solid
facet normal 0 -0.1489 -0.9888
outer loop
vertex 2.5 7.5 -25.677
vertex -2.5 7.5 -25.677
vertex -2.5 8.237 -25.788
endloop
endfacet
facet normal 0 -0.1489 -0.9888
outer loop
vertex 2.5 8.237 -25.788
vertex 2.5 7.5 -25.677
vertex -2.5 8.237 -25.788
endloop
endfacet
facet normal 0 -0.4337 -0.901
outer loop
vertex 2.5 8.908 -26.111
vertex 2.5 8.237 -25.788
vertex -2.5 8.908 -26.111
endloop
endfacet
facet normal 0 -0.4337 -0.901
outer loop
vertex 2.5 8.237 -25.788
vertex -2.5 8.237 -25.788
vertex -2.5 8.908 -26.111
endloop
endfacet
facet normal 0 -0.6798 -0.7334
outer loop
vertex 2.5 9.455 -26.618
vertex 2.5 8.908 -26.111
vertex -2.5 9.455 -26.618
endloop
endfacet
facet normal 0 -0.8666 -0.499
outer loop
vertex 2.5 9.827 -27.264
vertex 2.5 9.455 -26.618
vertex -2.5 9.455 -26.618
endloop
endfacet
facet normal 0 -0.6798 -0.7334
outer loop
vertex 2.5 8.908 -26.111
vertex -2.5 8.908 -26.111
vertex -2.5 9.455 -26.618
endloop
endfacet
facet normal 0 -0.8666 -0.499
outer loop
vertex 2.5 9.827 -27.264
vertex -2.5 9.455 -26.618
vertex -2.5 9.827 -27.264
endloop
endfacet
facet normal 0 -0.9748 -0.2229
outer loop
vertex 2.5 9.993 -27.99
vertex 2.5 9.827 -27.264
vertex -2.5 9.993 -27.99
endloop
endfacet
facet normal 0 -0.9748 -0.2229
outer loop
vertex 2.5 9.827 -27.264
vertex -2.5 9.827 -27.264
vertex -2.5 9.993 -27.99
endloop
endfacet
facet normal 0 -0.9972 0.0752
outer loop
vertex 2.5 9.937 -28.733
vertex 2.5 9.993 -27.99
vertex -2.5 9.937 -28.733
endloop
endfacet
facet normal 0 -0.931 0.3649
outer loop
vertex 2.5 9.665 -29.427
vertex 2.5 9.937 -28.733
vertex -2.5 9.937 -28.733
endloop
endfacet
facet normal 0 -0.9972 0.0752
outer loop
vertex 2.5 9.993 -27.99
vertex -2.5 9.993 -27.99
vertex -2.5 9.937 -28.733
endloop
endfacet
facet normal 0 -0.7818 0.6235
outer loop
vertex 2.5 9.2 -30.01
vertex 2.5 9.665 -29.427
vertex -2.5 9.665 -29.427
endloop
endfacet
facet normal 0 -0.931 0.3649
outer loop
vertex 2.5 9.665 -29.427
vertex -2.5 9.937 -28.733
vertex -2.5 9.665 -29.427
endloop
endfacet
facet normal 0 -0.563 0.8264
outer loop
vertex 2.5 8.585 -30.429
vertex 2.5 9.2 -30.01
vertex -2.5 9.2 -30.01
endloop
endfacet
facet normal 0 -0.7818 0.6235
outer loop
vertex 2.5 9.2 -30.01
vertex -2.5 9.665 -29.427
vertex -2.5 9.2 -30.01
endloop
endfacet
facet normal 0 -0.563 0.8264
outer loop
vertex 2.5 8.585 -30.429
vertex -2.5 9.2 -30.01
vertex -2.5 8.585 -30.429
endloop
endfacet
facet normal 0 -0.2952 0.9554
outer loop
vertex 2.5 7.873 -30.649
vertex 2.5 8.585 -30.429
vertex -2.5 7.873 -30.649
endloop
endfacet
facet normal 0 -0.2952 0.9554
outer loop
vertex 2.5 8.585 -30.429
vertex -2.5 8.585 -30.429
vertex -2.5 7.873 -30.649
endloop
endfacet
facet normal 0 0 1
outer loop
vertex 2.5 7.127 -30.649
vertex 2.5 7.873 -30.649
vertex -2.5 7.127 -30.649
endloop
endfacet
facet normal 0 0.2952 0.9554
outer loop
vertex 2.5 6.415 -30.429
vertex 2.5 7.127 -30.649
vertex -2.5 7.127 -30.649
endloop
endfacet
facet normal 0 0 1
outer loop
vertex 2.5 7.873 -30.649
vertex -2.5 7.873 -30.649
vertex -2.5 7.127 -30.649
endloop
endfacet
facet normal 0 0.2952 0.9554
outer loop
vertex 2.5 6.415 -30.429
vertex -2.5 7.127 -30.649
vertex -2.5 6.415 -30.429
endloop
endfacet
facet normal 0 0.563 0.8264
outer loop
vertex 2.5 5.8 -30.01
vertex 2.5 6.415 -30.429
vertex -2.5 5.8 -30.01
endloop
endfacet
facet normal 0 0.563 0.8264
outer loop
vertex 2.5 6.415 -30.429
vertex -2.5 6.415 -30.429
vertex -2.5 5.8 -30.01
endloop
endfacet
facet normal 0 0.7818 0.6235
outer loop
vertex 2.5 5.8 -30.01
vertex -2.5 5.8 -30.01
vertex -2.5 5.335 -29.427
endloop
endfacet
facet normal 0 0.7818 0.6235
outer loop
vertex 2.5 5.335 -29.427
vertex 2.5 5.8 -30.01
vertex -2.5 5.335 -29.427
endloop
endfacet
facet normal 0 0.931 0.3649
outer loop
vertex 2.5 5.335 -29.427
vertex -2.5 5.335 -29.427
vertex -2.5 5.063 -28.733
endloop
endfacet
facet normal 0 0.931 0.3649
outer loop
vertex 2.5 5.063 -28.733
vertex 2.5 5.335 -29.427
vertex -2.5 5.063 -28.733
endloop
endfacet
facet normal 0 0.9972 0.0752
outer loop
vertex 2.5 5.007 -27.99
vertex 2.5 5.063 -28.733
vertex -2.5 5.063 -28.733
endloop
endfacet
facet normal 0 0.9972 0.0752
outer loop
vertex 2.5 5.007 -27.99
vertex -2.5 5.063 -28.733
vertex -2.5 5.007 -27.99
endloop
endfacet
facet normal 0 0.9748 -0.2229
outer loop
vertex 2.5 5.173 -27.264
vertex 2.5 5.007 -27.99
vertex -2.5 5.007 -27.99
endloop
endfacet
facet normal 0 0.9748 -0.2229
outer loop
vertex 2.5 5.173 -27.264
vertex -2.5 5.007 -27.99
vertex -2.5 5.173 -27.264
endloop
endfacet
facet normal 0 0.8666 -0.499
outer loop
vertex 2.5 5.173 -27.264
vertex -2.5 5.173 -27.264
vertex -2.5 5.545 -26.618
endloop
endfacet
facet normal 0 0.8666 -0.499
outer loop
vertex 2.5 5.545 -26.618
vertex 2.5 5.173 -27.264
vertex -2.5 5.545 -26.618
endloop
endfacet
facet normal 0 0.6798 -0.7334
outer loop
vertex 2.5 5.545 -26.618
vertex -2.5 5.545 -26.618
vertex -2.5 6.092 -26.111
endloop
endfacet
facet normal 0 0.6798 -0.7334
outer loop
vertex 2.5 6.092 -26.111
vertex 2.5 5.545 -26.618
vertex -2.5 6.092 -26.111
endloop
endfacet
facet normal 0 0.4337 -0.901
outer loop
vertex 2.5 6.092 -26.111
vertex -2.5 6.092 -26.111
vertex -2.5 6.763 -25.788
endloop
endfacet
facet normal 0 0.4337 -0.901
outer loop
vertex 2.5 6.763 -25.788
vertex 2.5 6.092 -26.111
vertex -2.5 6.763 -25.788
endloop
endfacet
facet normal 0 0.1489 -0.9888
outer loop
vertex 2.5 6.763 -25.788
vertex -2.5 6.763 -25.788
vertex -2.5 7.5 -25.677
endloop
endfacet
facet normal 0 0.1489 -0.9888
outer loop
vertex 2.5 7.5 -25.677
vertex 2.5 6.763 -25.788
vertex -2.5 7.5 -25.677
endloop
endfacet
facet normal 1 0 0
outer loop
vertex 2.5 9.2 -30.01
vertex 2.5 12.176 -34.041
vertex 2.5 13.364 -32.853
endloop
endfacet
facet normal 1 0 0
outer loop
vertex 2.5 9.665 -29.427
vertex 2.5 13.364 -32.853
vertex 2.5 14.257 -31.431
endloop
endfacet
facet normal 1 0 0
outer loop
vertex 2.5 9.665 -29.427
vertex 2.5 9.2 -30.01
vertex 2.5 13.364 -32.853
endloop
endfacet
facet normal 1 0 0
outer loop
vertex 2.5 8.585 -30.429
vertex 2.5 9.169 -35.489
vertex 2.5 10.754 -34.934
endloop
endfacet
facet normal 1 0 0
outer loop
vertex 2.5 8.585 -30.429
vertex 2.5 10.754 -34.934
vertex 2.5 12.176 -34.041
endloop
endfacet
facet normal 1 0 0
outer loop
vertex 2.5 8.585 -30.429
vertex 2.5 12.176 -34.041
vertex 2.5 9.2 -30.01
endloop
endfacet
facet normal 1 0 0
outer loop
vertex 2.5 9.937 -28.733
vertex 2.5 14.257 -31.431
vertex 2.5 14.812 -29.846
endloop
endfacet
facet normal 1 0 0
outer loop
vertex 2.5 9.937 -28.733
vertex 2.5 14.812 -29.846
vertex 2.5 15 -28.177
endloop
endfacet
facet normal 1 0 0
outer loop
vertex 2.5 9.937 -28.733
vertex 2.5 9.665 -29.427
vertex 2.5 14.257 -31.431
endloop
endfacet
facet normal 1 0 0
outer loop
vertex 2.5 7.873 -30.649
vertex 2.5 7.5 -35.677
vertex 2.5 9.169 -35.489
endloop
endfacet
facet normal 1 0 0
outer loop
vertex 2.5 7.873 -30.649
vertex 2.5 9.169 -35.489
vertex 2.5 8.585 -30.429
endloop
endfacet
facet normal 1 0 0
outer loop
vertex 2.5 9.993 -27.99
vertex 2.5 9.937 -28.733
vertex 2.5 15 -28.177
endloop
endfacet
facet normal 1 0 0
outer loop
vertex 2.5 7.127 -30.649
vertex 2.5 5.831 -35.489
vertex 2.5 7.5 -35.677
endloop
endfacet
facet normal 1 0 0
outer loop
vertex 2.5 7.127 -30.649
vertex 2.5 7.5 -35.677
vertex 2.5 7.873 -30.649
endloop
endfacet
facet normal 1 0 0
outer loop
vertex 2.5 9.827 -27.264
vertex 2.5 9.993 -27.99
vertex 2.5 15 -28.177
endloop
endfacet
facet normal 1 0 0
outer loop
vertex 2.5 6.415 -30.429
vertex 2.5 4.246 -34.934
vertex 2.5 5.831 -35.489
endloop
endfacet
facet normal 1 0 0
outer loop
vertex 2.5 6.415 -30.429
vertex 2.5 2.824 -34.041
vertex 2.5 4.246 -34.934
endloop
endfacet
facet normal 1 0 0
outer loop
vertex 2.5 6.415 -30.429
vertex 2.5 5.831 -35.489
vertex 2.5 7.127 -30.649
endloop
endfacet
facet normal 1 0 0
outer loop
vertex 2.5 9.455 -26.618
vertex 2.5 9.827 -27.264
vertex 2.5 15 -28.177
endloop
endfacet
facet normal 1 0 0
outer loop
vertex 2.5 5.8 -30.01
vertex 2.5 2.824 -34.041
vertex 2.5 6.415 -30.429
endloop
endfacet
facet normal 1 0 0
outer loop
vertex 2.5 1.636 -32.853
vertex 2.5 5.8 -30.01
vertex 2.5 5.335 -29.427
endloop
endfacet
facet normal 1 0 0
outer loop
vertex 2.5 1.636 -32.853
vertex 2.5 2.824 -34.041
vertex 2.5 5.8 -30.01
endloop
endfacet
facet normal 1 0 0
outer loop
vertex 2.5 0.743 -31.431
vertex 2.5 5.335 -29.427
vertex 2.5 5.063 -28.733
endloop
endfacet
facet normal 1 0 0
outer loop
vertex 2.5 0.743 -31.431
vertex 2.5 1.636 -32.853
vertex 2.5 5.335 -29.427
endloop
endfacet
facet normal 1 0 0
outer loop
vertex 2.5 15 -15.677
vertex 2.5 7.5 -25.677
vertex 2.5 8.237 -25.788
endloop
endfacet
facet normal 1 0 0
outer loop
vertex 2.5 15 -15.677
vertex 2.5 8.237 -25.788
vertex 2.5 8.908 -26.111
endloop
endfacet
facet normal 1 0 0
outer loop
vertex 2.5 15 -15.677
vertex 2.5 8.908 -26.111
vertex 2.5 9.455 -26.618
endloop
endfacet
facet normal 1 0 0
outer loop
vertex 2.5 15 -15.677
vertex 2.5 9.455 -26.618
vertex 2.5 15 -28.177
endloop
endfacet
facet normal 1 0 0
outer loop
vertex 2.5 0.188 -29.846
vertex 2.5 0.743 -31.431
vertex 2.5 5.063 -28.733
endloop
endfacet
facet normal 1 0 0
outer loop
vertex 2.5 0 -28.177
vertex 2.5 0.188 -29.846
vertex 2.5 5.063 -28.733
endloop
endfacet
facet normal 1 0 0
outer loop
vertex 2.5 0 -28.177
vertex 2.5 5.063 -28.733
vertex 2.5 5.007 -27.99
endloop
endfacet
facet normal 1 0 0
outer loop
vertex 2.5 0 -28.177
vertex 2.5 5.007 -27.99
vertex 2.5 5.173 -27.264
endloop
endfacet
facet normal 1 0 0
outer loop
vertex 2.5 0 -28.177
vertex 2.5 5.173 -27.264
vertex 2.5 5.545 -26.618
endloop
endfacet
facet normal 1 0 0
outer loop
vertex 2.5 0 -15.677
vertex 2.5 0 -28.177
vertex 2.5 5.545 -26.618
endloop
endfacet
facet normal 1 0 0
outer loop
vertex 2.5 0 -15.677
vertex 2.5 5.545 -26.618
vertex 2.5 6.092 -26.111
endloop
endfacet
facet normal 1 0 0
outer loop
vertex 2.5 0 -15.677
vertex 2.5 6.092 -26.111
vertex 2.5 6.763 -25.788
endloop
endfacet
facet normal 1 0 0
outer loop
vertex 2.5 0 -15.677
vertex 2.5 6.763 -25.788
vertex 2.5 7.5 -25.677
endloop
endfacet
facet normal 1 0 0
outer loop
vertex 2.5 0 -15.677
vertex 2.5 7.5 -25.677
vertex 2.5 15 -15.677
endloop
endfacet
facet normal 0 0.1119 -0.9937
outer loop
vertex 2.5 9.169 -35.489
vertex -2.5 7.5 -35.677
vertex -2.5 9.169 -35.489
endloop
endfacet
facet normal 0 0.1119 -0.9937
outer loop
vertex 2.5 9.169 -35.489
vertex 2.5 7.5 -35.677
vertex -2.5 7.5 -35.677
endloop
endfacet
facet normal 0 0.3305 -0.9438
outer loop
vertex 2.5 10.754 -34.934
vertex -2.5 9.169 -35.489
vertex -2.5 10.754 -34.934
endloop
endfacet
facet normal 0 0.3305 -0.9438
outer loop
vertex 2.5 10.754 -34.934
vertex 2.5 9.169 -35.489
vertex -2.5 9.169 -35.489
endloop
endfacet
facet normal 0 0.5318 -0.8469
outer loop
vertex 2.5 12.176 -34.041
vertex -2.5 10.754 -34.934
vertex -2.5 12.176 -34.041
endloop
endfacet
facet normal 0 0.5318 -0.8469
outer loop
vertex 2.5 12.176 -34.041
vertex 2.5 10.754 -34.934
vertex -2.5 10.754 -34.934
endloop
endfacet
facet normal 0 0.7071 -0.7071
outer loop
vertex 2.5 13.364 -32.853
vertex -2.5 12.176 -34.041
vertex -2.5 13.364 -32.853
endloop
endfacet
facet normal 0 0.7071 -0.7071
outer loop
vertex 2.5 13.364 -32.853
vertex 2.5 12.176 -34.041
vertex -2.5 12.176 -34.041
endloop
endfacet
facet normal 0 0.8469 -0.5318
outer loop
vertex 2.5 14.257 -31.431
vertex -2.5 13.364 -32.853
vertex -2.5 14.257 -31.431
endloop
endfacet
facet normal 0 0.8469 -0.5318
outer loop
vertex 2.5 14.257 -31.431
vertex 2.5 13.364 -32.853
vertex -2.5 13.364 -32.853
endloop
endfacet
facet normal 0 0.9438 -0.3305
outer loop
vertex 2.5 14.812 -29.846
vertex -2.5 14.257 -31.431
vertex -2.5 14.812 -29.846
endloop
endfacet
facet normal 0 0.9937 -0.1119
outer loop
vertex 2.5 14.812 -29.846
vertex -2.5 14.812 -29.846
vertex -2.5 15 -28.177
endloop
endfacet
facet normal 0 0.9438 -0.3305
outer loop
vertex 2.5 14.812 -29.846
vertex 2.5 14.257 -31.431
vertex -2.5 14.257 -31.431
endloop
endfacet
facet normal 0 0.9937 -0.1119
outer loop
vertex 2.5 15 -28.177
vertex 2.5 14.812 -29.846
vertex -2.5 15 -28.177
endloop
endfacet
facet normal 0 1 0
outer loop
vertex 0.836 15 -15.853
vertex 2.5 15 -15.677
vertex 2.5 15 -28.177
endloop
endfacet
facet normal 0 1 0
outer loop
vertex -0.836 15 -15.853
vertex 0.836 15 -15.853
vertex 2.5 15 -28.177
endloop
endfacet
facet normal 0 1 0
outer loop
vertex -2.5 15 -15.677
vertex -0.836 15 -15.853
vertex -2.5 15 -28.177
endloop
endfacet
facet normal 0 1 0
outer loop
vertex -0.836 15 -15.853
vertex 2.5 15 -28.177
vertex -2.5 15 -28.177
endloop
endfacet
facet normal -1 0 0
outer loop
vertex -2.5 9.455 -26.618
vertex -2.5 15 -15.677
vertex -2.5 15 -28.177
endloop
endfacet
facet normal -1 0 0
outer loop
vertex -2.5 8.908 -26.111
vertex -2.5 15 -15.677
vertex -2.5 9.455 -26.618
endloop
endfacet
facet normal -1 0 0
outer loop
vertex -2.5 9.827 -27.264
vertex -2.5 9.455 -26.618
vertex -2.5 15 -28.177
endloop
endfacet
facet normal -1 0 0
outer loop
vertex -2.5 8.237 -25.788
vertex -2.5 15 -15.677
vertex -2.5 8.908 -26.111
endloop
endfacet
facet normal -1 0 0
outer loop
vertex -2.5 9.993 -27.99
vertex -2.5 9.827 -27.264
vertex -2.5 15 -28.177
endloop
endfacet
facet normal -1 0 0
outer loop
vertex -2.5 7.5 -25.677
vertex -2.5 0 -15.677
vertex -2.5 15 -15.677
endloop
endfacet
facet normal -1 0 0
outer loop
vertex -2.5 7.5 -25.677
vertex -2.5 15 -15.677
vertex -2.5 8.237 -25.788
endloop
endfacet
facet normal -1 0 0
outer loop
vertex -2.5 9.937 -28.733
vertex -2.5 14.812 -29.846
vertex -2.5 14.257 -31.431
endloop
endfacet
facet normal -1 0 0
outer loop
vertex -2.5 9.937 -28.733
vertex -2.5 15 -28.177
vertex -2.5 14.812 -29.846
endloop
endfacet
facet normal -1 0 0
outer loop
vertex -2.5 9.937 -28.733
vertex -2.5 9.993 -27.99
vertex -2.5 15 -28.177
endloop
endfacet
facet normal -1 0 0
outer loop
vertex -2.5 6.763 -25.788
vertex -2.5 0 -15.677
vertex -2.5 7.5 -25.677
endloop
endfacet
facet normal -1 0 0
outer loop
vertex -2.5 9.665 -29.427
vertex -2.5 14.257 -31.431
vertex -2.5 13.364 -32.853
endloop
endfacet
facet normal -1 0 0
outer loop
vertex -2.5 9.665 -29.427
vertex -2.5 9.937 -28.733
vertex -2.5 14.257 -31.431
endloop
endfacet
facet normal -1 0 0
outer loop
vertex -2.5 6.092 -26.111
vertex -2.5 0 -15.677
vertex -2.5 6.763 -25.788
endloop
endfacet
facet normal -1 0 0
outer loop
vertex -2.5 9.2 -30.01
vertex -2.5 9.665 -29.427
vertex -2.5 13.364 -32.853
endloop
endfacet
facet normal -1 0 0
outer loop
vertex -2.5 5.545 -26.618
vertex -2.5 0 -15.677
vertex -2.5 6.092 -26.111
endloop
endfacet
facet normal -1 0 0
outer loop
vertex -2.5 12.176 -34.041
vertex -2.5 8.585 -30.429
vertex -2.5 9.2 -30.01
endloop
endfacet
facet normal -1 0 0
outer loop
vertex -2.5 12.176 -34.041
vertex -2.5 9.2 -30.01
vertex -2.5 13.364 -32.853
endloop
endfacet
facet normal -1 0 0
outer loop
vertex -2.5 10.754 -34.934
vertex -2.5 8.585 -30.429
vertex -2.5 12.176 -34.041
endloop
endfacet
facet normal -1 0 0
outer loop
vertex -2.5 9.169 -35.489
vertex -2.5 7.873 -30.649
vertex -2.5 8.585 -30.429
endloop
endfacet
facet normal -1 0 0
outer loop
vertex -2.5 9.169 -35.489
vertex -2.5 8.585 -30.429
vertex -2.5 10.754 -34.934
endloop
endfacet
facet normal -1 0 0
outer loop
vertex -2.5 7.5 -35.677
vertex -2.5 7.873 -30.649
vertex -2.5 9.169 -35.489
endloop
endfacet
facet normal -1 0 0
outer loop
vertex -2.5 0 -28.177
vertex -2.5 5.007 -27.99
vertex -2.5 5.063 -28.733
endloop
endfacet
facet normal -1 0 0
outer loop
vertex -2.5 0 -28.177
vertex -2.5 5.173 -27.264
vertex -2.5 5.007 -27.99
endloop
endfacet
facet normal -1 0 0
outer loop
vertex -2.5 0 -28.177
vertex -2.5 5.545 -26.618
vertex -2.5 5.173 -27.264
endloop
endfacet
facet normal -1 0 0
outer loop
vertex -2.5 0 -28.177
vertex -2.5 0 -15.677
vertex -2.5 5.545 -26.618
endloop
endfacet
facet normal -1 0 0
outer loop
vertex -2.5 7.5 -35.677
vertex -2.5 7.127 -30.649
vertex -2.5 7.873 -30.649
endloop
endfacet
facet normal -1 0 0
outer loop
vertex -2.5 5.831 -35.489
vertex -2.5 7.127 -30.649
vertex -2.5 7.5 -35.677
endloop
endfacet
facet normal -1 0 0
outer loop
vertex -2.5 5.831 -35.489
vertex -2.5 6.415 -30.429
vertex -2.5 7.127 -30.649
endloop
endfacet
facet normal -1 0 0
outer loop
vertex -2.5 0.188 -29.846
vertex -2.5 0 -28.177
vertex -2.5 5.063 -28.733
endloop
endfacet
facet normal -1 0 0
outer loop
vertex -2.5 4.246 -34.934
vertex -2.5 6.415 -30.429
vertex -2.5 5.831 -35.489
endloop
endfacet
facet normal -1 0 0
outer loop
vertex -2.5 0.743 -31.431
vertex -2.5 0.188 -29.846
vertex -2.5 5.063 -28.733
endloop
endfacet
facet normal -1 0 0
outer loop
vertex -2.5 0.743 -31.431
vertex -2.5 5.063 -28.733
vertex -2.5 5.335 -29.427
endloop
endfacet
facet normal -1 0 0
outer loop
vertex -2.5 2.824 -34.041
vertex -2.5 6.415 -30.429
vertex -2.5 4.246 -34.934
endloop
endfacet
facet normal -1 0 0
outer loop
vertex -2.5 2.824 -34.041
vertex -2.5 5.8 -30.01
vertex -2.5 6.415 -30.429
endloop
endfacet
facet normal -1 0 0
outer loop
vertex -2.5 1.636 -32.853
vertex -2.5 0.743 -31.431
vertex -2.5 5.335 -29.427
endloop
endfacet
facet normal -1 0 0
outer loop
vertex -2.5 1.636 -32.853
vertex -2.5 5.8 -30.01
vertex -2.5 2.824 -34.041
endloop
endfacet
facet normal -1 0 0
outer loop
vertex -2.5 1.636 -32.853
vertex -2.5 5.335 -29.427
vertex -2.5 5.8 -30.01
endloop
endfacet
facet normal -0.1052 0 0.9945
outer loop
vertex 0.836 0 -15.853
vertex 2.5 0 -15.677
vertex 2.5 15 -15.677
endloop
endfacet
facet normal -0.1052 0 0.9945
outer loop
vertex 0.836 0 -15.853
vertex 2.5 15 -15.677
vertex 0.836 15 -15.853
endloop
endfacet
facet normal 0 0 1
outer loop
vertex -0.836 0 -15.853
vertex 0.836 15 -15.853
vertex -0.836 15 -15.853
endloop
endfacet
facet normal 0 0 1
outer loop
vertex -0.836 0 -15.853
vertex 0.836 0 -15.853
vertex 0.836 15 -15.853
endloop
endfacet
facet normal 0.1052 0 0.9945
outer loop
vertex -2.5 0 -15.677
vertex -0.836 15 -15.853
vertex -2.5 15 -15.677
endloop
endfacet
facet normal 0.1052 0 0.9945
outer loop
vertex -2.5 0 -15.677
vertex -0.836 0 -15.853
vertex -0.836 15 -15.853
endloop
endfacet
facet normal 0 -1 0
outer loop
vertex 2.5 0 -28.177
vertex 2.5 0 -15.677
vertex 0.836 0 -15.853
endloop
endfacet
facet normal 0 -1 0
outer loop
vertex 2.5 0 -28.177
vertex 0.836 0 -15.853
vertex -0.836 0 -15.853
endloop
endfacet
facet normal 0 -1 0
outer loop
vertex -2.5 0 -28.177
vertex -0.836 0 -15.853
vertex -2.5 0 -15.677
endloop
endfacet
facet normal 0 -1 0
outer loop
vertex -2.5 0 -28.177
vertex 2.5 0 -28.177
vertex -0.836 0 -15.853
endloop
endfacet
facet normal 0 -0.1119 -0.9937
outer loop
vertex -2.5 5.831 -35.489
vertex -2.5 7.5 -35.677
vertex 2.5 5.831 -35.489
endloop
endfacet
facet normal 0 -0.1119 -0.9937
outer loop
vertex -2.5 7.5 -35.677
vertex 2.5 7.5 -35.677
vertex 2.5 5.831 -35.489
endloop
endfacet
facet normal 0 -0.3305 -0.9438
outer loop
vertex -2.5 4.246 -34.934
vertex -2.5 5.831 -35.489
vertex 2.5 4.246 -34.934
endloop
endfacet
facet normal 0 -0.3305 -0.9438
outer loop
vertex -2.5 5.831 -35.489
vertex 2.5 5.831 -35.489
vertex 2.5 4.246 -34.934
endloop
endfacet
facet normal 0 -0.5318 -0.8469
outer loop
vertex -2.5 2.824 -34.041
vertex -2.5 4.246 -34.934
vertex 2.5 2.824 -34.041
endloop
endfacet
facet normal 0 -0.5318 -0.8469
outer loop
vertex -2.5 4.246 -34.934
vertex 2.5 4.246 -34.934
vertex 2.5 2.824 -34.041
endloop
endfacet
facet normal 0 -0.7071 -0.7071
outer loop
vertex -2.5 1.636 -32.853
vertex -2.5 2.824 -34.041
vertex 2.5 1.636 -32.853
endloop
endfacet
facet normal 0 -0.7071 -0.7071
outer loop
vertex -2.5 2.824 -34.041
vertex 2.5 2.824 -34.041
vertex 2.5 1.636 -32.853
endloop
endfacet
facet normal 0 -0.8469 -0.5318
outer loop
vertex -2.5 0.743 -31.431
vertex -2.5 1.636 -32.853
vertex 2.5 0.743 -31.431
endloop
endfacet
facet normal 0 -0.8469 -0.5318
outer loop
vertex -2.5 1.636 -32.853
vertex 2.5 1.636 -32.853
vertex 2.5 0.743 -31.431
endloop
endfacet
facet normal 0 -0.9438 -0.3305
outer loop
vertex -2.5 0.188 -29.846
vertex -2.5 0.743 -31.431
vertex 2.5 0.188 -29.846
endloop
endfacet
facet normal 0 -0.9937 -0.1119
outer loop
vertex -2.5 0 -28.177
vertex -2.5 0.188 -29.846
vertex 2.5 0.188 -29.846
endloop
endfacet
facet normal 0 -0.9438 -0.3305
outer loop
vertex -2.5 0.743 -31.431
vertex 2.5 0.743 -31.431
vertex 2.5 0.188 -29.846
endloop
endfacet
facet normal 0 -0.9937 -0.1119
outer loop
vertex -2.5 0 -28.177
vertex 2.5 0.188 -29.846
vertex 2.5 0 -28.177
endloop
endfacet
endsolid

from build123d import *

# Parameters (mm, degrees)
BOSS_EXTRUDE1_DEPTH = 15
FILLET1_R           = 7.5
SKETCH2_R           = 2.5
CUT_EXTRUDE1_DEPTH  = 40.023610486


with BuildPart() as part:
    # Sketch1 → Boss-Extrude1 (new body)
    with BuildSketch(Plane(origin=(0, 0, 0), x_dir=(1, 0, 0), z_dir=(0, 1, 0))):
        with BuildLine():
            Line((-2.5, 15.676913759), (-2.5, 35.676913759))
            Line((-2.5, 35.676913759), (2.5, 35.676913759))
            Line((2.5, 35.676913759), (2.5, 15.676913759))
            ThreePointArc((2.5, 15.676913759), (0, 15.875), (-2.5, 15.676913759))
        make_face()
    extrude(amount=BOSS_EXTRUDE1_DEPTH)

    # Fillet1
    fillet1_edges = [part.edges().sort_by_distance(p)[0] for p in [
        (0, 0, -35.676913759),
        (0, 15, -35.676913759),
    ]]
    fillet(fillet1_edges, radius=FILLET1_R - 0.0001)  # a hair under: the kernel refuses the full size

    # Sketch2 → Cut-Extrude1 (cut, through all)
    with BuildSketch(Plane.ZY.offset(2.5)):
        with Locations((-28.176913759, 7.5)):
            Circle(SKETCH2_R)
    extrude(amount=-CUT_EXTRUDE1_DEPTH, mode=Mode.SUBTRACT)


solid = part.part
